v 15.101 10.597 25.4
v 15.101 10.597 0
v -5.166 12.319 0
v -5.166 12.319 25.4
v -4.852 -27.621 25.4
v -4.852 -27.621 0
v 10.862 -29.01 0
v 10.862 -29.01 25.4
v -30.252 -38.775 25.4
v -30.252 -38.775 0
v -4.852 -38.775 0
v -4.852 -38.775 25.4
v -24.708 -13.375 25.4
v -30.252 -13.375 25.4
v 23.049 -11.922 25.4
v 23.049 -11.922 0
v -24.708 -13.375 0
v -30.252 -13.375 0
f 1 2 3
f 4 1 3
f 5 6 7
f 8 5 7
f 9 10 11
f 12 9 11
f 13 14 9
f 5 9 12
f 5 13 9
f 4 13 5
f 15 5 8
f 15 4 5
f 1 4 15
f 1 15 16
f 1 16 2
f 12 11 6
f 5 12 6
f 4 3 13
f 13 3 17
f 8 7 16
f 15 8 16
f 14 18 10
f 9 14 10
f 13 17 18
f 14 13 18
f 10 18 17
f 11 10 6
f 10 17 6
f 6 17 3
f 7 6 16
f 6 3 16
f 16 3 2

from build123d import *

# Parameters (mm, degrees)
F1_DEPTH = 25.4


with BuildPart() as f1:
    # F0 (on Top) → F1 (new body)
    with BuildSketch(Plane.XY):
        Polygon((-8.610348, -27.288182), (-4.851862, -27.620565), (-4.851862, -13.374916), (-24.708377, -13.374916), (-26.625844, -15.89603), align=None)
        Polygon((-4.851862, -13.374916), (-4.851862, -27.620565), (10.862285, -29.010251), (23.049237, -11.922023), (15.101224, 10.597347), (-5.166208, 12.319417), (-24.708377, -13.374916), align=None)
        Polygon((-30.251862, -13.374916), (-30.251862, -38.774916), (-4.851862, -38.774916), (-4.851862, -27.620565), (-8.610348, -27.288182), (-26.625844, -15.89603), (-24.708377, -13.374916), align=None)
    extrude(amount=F1_DEPTH)


solid = f1.part
